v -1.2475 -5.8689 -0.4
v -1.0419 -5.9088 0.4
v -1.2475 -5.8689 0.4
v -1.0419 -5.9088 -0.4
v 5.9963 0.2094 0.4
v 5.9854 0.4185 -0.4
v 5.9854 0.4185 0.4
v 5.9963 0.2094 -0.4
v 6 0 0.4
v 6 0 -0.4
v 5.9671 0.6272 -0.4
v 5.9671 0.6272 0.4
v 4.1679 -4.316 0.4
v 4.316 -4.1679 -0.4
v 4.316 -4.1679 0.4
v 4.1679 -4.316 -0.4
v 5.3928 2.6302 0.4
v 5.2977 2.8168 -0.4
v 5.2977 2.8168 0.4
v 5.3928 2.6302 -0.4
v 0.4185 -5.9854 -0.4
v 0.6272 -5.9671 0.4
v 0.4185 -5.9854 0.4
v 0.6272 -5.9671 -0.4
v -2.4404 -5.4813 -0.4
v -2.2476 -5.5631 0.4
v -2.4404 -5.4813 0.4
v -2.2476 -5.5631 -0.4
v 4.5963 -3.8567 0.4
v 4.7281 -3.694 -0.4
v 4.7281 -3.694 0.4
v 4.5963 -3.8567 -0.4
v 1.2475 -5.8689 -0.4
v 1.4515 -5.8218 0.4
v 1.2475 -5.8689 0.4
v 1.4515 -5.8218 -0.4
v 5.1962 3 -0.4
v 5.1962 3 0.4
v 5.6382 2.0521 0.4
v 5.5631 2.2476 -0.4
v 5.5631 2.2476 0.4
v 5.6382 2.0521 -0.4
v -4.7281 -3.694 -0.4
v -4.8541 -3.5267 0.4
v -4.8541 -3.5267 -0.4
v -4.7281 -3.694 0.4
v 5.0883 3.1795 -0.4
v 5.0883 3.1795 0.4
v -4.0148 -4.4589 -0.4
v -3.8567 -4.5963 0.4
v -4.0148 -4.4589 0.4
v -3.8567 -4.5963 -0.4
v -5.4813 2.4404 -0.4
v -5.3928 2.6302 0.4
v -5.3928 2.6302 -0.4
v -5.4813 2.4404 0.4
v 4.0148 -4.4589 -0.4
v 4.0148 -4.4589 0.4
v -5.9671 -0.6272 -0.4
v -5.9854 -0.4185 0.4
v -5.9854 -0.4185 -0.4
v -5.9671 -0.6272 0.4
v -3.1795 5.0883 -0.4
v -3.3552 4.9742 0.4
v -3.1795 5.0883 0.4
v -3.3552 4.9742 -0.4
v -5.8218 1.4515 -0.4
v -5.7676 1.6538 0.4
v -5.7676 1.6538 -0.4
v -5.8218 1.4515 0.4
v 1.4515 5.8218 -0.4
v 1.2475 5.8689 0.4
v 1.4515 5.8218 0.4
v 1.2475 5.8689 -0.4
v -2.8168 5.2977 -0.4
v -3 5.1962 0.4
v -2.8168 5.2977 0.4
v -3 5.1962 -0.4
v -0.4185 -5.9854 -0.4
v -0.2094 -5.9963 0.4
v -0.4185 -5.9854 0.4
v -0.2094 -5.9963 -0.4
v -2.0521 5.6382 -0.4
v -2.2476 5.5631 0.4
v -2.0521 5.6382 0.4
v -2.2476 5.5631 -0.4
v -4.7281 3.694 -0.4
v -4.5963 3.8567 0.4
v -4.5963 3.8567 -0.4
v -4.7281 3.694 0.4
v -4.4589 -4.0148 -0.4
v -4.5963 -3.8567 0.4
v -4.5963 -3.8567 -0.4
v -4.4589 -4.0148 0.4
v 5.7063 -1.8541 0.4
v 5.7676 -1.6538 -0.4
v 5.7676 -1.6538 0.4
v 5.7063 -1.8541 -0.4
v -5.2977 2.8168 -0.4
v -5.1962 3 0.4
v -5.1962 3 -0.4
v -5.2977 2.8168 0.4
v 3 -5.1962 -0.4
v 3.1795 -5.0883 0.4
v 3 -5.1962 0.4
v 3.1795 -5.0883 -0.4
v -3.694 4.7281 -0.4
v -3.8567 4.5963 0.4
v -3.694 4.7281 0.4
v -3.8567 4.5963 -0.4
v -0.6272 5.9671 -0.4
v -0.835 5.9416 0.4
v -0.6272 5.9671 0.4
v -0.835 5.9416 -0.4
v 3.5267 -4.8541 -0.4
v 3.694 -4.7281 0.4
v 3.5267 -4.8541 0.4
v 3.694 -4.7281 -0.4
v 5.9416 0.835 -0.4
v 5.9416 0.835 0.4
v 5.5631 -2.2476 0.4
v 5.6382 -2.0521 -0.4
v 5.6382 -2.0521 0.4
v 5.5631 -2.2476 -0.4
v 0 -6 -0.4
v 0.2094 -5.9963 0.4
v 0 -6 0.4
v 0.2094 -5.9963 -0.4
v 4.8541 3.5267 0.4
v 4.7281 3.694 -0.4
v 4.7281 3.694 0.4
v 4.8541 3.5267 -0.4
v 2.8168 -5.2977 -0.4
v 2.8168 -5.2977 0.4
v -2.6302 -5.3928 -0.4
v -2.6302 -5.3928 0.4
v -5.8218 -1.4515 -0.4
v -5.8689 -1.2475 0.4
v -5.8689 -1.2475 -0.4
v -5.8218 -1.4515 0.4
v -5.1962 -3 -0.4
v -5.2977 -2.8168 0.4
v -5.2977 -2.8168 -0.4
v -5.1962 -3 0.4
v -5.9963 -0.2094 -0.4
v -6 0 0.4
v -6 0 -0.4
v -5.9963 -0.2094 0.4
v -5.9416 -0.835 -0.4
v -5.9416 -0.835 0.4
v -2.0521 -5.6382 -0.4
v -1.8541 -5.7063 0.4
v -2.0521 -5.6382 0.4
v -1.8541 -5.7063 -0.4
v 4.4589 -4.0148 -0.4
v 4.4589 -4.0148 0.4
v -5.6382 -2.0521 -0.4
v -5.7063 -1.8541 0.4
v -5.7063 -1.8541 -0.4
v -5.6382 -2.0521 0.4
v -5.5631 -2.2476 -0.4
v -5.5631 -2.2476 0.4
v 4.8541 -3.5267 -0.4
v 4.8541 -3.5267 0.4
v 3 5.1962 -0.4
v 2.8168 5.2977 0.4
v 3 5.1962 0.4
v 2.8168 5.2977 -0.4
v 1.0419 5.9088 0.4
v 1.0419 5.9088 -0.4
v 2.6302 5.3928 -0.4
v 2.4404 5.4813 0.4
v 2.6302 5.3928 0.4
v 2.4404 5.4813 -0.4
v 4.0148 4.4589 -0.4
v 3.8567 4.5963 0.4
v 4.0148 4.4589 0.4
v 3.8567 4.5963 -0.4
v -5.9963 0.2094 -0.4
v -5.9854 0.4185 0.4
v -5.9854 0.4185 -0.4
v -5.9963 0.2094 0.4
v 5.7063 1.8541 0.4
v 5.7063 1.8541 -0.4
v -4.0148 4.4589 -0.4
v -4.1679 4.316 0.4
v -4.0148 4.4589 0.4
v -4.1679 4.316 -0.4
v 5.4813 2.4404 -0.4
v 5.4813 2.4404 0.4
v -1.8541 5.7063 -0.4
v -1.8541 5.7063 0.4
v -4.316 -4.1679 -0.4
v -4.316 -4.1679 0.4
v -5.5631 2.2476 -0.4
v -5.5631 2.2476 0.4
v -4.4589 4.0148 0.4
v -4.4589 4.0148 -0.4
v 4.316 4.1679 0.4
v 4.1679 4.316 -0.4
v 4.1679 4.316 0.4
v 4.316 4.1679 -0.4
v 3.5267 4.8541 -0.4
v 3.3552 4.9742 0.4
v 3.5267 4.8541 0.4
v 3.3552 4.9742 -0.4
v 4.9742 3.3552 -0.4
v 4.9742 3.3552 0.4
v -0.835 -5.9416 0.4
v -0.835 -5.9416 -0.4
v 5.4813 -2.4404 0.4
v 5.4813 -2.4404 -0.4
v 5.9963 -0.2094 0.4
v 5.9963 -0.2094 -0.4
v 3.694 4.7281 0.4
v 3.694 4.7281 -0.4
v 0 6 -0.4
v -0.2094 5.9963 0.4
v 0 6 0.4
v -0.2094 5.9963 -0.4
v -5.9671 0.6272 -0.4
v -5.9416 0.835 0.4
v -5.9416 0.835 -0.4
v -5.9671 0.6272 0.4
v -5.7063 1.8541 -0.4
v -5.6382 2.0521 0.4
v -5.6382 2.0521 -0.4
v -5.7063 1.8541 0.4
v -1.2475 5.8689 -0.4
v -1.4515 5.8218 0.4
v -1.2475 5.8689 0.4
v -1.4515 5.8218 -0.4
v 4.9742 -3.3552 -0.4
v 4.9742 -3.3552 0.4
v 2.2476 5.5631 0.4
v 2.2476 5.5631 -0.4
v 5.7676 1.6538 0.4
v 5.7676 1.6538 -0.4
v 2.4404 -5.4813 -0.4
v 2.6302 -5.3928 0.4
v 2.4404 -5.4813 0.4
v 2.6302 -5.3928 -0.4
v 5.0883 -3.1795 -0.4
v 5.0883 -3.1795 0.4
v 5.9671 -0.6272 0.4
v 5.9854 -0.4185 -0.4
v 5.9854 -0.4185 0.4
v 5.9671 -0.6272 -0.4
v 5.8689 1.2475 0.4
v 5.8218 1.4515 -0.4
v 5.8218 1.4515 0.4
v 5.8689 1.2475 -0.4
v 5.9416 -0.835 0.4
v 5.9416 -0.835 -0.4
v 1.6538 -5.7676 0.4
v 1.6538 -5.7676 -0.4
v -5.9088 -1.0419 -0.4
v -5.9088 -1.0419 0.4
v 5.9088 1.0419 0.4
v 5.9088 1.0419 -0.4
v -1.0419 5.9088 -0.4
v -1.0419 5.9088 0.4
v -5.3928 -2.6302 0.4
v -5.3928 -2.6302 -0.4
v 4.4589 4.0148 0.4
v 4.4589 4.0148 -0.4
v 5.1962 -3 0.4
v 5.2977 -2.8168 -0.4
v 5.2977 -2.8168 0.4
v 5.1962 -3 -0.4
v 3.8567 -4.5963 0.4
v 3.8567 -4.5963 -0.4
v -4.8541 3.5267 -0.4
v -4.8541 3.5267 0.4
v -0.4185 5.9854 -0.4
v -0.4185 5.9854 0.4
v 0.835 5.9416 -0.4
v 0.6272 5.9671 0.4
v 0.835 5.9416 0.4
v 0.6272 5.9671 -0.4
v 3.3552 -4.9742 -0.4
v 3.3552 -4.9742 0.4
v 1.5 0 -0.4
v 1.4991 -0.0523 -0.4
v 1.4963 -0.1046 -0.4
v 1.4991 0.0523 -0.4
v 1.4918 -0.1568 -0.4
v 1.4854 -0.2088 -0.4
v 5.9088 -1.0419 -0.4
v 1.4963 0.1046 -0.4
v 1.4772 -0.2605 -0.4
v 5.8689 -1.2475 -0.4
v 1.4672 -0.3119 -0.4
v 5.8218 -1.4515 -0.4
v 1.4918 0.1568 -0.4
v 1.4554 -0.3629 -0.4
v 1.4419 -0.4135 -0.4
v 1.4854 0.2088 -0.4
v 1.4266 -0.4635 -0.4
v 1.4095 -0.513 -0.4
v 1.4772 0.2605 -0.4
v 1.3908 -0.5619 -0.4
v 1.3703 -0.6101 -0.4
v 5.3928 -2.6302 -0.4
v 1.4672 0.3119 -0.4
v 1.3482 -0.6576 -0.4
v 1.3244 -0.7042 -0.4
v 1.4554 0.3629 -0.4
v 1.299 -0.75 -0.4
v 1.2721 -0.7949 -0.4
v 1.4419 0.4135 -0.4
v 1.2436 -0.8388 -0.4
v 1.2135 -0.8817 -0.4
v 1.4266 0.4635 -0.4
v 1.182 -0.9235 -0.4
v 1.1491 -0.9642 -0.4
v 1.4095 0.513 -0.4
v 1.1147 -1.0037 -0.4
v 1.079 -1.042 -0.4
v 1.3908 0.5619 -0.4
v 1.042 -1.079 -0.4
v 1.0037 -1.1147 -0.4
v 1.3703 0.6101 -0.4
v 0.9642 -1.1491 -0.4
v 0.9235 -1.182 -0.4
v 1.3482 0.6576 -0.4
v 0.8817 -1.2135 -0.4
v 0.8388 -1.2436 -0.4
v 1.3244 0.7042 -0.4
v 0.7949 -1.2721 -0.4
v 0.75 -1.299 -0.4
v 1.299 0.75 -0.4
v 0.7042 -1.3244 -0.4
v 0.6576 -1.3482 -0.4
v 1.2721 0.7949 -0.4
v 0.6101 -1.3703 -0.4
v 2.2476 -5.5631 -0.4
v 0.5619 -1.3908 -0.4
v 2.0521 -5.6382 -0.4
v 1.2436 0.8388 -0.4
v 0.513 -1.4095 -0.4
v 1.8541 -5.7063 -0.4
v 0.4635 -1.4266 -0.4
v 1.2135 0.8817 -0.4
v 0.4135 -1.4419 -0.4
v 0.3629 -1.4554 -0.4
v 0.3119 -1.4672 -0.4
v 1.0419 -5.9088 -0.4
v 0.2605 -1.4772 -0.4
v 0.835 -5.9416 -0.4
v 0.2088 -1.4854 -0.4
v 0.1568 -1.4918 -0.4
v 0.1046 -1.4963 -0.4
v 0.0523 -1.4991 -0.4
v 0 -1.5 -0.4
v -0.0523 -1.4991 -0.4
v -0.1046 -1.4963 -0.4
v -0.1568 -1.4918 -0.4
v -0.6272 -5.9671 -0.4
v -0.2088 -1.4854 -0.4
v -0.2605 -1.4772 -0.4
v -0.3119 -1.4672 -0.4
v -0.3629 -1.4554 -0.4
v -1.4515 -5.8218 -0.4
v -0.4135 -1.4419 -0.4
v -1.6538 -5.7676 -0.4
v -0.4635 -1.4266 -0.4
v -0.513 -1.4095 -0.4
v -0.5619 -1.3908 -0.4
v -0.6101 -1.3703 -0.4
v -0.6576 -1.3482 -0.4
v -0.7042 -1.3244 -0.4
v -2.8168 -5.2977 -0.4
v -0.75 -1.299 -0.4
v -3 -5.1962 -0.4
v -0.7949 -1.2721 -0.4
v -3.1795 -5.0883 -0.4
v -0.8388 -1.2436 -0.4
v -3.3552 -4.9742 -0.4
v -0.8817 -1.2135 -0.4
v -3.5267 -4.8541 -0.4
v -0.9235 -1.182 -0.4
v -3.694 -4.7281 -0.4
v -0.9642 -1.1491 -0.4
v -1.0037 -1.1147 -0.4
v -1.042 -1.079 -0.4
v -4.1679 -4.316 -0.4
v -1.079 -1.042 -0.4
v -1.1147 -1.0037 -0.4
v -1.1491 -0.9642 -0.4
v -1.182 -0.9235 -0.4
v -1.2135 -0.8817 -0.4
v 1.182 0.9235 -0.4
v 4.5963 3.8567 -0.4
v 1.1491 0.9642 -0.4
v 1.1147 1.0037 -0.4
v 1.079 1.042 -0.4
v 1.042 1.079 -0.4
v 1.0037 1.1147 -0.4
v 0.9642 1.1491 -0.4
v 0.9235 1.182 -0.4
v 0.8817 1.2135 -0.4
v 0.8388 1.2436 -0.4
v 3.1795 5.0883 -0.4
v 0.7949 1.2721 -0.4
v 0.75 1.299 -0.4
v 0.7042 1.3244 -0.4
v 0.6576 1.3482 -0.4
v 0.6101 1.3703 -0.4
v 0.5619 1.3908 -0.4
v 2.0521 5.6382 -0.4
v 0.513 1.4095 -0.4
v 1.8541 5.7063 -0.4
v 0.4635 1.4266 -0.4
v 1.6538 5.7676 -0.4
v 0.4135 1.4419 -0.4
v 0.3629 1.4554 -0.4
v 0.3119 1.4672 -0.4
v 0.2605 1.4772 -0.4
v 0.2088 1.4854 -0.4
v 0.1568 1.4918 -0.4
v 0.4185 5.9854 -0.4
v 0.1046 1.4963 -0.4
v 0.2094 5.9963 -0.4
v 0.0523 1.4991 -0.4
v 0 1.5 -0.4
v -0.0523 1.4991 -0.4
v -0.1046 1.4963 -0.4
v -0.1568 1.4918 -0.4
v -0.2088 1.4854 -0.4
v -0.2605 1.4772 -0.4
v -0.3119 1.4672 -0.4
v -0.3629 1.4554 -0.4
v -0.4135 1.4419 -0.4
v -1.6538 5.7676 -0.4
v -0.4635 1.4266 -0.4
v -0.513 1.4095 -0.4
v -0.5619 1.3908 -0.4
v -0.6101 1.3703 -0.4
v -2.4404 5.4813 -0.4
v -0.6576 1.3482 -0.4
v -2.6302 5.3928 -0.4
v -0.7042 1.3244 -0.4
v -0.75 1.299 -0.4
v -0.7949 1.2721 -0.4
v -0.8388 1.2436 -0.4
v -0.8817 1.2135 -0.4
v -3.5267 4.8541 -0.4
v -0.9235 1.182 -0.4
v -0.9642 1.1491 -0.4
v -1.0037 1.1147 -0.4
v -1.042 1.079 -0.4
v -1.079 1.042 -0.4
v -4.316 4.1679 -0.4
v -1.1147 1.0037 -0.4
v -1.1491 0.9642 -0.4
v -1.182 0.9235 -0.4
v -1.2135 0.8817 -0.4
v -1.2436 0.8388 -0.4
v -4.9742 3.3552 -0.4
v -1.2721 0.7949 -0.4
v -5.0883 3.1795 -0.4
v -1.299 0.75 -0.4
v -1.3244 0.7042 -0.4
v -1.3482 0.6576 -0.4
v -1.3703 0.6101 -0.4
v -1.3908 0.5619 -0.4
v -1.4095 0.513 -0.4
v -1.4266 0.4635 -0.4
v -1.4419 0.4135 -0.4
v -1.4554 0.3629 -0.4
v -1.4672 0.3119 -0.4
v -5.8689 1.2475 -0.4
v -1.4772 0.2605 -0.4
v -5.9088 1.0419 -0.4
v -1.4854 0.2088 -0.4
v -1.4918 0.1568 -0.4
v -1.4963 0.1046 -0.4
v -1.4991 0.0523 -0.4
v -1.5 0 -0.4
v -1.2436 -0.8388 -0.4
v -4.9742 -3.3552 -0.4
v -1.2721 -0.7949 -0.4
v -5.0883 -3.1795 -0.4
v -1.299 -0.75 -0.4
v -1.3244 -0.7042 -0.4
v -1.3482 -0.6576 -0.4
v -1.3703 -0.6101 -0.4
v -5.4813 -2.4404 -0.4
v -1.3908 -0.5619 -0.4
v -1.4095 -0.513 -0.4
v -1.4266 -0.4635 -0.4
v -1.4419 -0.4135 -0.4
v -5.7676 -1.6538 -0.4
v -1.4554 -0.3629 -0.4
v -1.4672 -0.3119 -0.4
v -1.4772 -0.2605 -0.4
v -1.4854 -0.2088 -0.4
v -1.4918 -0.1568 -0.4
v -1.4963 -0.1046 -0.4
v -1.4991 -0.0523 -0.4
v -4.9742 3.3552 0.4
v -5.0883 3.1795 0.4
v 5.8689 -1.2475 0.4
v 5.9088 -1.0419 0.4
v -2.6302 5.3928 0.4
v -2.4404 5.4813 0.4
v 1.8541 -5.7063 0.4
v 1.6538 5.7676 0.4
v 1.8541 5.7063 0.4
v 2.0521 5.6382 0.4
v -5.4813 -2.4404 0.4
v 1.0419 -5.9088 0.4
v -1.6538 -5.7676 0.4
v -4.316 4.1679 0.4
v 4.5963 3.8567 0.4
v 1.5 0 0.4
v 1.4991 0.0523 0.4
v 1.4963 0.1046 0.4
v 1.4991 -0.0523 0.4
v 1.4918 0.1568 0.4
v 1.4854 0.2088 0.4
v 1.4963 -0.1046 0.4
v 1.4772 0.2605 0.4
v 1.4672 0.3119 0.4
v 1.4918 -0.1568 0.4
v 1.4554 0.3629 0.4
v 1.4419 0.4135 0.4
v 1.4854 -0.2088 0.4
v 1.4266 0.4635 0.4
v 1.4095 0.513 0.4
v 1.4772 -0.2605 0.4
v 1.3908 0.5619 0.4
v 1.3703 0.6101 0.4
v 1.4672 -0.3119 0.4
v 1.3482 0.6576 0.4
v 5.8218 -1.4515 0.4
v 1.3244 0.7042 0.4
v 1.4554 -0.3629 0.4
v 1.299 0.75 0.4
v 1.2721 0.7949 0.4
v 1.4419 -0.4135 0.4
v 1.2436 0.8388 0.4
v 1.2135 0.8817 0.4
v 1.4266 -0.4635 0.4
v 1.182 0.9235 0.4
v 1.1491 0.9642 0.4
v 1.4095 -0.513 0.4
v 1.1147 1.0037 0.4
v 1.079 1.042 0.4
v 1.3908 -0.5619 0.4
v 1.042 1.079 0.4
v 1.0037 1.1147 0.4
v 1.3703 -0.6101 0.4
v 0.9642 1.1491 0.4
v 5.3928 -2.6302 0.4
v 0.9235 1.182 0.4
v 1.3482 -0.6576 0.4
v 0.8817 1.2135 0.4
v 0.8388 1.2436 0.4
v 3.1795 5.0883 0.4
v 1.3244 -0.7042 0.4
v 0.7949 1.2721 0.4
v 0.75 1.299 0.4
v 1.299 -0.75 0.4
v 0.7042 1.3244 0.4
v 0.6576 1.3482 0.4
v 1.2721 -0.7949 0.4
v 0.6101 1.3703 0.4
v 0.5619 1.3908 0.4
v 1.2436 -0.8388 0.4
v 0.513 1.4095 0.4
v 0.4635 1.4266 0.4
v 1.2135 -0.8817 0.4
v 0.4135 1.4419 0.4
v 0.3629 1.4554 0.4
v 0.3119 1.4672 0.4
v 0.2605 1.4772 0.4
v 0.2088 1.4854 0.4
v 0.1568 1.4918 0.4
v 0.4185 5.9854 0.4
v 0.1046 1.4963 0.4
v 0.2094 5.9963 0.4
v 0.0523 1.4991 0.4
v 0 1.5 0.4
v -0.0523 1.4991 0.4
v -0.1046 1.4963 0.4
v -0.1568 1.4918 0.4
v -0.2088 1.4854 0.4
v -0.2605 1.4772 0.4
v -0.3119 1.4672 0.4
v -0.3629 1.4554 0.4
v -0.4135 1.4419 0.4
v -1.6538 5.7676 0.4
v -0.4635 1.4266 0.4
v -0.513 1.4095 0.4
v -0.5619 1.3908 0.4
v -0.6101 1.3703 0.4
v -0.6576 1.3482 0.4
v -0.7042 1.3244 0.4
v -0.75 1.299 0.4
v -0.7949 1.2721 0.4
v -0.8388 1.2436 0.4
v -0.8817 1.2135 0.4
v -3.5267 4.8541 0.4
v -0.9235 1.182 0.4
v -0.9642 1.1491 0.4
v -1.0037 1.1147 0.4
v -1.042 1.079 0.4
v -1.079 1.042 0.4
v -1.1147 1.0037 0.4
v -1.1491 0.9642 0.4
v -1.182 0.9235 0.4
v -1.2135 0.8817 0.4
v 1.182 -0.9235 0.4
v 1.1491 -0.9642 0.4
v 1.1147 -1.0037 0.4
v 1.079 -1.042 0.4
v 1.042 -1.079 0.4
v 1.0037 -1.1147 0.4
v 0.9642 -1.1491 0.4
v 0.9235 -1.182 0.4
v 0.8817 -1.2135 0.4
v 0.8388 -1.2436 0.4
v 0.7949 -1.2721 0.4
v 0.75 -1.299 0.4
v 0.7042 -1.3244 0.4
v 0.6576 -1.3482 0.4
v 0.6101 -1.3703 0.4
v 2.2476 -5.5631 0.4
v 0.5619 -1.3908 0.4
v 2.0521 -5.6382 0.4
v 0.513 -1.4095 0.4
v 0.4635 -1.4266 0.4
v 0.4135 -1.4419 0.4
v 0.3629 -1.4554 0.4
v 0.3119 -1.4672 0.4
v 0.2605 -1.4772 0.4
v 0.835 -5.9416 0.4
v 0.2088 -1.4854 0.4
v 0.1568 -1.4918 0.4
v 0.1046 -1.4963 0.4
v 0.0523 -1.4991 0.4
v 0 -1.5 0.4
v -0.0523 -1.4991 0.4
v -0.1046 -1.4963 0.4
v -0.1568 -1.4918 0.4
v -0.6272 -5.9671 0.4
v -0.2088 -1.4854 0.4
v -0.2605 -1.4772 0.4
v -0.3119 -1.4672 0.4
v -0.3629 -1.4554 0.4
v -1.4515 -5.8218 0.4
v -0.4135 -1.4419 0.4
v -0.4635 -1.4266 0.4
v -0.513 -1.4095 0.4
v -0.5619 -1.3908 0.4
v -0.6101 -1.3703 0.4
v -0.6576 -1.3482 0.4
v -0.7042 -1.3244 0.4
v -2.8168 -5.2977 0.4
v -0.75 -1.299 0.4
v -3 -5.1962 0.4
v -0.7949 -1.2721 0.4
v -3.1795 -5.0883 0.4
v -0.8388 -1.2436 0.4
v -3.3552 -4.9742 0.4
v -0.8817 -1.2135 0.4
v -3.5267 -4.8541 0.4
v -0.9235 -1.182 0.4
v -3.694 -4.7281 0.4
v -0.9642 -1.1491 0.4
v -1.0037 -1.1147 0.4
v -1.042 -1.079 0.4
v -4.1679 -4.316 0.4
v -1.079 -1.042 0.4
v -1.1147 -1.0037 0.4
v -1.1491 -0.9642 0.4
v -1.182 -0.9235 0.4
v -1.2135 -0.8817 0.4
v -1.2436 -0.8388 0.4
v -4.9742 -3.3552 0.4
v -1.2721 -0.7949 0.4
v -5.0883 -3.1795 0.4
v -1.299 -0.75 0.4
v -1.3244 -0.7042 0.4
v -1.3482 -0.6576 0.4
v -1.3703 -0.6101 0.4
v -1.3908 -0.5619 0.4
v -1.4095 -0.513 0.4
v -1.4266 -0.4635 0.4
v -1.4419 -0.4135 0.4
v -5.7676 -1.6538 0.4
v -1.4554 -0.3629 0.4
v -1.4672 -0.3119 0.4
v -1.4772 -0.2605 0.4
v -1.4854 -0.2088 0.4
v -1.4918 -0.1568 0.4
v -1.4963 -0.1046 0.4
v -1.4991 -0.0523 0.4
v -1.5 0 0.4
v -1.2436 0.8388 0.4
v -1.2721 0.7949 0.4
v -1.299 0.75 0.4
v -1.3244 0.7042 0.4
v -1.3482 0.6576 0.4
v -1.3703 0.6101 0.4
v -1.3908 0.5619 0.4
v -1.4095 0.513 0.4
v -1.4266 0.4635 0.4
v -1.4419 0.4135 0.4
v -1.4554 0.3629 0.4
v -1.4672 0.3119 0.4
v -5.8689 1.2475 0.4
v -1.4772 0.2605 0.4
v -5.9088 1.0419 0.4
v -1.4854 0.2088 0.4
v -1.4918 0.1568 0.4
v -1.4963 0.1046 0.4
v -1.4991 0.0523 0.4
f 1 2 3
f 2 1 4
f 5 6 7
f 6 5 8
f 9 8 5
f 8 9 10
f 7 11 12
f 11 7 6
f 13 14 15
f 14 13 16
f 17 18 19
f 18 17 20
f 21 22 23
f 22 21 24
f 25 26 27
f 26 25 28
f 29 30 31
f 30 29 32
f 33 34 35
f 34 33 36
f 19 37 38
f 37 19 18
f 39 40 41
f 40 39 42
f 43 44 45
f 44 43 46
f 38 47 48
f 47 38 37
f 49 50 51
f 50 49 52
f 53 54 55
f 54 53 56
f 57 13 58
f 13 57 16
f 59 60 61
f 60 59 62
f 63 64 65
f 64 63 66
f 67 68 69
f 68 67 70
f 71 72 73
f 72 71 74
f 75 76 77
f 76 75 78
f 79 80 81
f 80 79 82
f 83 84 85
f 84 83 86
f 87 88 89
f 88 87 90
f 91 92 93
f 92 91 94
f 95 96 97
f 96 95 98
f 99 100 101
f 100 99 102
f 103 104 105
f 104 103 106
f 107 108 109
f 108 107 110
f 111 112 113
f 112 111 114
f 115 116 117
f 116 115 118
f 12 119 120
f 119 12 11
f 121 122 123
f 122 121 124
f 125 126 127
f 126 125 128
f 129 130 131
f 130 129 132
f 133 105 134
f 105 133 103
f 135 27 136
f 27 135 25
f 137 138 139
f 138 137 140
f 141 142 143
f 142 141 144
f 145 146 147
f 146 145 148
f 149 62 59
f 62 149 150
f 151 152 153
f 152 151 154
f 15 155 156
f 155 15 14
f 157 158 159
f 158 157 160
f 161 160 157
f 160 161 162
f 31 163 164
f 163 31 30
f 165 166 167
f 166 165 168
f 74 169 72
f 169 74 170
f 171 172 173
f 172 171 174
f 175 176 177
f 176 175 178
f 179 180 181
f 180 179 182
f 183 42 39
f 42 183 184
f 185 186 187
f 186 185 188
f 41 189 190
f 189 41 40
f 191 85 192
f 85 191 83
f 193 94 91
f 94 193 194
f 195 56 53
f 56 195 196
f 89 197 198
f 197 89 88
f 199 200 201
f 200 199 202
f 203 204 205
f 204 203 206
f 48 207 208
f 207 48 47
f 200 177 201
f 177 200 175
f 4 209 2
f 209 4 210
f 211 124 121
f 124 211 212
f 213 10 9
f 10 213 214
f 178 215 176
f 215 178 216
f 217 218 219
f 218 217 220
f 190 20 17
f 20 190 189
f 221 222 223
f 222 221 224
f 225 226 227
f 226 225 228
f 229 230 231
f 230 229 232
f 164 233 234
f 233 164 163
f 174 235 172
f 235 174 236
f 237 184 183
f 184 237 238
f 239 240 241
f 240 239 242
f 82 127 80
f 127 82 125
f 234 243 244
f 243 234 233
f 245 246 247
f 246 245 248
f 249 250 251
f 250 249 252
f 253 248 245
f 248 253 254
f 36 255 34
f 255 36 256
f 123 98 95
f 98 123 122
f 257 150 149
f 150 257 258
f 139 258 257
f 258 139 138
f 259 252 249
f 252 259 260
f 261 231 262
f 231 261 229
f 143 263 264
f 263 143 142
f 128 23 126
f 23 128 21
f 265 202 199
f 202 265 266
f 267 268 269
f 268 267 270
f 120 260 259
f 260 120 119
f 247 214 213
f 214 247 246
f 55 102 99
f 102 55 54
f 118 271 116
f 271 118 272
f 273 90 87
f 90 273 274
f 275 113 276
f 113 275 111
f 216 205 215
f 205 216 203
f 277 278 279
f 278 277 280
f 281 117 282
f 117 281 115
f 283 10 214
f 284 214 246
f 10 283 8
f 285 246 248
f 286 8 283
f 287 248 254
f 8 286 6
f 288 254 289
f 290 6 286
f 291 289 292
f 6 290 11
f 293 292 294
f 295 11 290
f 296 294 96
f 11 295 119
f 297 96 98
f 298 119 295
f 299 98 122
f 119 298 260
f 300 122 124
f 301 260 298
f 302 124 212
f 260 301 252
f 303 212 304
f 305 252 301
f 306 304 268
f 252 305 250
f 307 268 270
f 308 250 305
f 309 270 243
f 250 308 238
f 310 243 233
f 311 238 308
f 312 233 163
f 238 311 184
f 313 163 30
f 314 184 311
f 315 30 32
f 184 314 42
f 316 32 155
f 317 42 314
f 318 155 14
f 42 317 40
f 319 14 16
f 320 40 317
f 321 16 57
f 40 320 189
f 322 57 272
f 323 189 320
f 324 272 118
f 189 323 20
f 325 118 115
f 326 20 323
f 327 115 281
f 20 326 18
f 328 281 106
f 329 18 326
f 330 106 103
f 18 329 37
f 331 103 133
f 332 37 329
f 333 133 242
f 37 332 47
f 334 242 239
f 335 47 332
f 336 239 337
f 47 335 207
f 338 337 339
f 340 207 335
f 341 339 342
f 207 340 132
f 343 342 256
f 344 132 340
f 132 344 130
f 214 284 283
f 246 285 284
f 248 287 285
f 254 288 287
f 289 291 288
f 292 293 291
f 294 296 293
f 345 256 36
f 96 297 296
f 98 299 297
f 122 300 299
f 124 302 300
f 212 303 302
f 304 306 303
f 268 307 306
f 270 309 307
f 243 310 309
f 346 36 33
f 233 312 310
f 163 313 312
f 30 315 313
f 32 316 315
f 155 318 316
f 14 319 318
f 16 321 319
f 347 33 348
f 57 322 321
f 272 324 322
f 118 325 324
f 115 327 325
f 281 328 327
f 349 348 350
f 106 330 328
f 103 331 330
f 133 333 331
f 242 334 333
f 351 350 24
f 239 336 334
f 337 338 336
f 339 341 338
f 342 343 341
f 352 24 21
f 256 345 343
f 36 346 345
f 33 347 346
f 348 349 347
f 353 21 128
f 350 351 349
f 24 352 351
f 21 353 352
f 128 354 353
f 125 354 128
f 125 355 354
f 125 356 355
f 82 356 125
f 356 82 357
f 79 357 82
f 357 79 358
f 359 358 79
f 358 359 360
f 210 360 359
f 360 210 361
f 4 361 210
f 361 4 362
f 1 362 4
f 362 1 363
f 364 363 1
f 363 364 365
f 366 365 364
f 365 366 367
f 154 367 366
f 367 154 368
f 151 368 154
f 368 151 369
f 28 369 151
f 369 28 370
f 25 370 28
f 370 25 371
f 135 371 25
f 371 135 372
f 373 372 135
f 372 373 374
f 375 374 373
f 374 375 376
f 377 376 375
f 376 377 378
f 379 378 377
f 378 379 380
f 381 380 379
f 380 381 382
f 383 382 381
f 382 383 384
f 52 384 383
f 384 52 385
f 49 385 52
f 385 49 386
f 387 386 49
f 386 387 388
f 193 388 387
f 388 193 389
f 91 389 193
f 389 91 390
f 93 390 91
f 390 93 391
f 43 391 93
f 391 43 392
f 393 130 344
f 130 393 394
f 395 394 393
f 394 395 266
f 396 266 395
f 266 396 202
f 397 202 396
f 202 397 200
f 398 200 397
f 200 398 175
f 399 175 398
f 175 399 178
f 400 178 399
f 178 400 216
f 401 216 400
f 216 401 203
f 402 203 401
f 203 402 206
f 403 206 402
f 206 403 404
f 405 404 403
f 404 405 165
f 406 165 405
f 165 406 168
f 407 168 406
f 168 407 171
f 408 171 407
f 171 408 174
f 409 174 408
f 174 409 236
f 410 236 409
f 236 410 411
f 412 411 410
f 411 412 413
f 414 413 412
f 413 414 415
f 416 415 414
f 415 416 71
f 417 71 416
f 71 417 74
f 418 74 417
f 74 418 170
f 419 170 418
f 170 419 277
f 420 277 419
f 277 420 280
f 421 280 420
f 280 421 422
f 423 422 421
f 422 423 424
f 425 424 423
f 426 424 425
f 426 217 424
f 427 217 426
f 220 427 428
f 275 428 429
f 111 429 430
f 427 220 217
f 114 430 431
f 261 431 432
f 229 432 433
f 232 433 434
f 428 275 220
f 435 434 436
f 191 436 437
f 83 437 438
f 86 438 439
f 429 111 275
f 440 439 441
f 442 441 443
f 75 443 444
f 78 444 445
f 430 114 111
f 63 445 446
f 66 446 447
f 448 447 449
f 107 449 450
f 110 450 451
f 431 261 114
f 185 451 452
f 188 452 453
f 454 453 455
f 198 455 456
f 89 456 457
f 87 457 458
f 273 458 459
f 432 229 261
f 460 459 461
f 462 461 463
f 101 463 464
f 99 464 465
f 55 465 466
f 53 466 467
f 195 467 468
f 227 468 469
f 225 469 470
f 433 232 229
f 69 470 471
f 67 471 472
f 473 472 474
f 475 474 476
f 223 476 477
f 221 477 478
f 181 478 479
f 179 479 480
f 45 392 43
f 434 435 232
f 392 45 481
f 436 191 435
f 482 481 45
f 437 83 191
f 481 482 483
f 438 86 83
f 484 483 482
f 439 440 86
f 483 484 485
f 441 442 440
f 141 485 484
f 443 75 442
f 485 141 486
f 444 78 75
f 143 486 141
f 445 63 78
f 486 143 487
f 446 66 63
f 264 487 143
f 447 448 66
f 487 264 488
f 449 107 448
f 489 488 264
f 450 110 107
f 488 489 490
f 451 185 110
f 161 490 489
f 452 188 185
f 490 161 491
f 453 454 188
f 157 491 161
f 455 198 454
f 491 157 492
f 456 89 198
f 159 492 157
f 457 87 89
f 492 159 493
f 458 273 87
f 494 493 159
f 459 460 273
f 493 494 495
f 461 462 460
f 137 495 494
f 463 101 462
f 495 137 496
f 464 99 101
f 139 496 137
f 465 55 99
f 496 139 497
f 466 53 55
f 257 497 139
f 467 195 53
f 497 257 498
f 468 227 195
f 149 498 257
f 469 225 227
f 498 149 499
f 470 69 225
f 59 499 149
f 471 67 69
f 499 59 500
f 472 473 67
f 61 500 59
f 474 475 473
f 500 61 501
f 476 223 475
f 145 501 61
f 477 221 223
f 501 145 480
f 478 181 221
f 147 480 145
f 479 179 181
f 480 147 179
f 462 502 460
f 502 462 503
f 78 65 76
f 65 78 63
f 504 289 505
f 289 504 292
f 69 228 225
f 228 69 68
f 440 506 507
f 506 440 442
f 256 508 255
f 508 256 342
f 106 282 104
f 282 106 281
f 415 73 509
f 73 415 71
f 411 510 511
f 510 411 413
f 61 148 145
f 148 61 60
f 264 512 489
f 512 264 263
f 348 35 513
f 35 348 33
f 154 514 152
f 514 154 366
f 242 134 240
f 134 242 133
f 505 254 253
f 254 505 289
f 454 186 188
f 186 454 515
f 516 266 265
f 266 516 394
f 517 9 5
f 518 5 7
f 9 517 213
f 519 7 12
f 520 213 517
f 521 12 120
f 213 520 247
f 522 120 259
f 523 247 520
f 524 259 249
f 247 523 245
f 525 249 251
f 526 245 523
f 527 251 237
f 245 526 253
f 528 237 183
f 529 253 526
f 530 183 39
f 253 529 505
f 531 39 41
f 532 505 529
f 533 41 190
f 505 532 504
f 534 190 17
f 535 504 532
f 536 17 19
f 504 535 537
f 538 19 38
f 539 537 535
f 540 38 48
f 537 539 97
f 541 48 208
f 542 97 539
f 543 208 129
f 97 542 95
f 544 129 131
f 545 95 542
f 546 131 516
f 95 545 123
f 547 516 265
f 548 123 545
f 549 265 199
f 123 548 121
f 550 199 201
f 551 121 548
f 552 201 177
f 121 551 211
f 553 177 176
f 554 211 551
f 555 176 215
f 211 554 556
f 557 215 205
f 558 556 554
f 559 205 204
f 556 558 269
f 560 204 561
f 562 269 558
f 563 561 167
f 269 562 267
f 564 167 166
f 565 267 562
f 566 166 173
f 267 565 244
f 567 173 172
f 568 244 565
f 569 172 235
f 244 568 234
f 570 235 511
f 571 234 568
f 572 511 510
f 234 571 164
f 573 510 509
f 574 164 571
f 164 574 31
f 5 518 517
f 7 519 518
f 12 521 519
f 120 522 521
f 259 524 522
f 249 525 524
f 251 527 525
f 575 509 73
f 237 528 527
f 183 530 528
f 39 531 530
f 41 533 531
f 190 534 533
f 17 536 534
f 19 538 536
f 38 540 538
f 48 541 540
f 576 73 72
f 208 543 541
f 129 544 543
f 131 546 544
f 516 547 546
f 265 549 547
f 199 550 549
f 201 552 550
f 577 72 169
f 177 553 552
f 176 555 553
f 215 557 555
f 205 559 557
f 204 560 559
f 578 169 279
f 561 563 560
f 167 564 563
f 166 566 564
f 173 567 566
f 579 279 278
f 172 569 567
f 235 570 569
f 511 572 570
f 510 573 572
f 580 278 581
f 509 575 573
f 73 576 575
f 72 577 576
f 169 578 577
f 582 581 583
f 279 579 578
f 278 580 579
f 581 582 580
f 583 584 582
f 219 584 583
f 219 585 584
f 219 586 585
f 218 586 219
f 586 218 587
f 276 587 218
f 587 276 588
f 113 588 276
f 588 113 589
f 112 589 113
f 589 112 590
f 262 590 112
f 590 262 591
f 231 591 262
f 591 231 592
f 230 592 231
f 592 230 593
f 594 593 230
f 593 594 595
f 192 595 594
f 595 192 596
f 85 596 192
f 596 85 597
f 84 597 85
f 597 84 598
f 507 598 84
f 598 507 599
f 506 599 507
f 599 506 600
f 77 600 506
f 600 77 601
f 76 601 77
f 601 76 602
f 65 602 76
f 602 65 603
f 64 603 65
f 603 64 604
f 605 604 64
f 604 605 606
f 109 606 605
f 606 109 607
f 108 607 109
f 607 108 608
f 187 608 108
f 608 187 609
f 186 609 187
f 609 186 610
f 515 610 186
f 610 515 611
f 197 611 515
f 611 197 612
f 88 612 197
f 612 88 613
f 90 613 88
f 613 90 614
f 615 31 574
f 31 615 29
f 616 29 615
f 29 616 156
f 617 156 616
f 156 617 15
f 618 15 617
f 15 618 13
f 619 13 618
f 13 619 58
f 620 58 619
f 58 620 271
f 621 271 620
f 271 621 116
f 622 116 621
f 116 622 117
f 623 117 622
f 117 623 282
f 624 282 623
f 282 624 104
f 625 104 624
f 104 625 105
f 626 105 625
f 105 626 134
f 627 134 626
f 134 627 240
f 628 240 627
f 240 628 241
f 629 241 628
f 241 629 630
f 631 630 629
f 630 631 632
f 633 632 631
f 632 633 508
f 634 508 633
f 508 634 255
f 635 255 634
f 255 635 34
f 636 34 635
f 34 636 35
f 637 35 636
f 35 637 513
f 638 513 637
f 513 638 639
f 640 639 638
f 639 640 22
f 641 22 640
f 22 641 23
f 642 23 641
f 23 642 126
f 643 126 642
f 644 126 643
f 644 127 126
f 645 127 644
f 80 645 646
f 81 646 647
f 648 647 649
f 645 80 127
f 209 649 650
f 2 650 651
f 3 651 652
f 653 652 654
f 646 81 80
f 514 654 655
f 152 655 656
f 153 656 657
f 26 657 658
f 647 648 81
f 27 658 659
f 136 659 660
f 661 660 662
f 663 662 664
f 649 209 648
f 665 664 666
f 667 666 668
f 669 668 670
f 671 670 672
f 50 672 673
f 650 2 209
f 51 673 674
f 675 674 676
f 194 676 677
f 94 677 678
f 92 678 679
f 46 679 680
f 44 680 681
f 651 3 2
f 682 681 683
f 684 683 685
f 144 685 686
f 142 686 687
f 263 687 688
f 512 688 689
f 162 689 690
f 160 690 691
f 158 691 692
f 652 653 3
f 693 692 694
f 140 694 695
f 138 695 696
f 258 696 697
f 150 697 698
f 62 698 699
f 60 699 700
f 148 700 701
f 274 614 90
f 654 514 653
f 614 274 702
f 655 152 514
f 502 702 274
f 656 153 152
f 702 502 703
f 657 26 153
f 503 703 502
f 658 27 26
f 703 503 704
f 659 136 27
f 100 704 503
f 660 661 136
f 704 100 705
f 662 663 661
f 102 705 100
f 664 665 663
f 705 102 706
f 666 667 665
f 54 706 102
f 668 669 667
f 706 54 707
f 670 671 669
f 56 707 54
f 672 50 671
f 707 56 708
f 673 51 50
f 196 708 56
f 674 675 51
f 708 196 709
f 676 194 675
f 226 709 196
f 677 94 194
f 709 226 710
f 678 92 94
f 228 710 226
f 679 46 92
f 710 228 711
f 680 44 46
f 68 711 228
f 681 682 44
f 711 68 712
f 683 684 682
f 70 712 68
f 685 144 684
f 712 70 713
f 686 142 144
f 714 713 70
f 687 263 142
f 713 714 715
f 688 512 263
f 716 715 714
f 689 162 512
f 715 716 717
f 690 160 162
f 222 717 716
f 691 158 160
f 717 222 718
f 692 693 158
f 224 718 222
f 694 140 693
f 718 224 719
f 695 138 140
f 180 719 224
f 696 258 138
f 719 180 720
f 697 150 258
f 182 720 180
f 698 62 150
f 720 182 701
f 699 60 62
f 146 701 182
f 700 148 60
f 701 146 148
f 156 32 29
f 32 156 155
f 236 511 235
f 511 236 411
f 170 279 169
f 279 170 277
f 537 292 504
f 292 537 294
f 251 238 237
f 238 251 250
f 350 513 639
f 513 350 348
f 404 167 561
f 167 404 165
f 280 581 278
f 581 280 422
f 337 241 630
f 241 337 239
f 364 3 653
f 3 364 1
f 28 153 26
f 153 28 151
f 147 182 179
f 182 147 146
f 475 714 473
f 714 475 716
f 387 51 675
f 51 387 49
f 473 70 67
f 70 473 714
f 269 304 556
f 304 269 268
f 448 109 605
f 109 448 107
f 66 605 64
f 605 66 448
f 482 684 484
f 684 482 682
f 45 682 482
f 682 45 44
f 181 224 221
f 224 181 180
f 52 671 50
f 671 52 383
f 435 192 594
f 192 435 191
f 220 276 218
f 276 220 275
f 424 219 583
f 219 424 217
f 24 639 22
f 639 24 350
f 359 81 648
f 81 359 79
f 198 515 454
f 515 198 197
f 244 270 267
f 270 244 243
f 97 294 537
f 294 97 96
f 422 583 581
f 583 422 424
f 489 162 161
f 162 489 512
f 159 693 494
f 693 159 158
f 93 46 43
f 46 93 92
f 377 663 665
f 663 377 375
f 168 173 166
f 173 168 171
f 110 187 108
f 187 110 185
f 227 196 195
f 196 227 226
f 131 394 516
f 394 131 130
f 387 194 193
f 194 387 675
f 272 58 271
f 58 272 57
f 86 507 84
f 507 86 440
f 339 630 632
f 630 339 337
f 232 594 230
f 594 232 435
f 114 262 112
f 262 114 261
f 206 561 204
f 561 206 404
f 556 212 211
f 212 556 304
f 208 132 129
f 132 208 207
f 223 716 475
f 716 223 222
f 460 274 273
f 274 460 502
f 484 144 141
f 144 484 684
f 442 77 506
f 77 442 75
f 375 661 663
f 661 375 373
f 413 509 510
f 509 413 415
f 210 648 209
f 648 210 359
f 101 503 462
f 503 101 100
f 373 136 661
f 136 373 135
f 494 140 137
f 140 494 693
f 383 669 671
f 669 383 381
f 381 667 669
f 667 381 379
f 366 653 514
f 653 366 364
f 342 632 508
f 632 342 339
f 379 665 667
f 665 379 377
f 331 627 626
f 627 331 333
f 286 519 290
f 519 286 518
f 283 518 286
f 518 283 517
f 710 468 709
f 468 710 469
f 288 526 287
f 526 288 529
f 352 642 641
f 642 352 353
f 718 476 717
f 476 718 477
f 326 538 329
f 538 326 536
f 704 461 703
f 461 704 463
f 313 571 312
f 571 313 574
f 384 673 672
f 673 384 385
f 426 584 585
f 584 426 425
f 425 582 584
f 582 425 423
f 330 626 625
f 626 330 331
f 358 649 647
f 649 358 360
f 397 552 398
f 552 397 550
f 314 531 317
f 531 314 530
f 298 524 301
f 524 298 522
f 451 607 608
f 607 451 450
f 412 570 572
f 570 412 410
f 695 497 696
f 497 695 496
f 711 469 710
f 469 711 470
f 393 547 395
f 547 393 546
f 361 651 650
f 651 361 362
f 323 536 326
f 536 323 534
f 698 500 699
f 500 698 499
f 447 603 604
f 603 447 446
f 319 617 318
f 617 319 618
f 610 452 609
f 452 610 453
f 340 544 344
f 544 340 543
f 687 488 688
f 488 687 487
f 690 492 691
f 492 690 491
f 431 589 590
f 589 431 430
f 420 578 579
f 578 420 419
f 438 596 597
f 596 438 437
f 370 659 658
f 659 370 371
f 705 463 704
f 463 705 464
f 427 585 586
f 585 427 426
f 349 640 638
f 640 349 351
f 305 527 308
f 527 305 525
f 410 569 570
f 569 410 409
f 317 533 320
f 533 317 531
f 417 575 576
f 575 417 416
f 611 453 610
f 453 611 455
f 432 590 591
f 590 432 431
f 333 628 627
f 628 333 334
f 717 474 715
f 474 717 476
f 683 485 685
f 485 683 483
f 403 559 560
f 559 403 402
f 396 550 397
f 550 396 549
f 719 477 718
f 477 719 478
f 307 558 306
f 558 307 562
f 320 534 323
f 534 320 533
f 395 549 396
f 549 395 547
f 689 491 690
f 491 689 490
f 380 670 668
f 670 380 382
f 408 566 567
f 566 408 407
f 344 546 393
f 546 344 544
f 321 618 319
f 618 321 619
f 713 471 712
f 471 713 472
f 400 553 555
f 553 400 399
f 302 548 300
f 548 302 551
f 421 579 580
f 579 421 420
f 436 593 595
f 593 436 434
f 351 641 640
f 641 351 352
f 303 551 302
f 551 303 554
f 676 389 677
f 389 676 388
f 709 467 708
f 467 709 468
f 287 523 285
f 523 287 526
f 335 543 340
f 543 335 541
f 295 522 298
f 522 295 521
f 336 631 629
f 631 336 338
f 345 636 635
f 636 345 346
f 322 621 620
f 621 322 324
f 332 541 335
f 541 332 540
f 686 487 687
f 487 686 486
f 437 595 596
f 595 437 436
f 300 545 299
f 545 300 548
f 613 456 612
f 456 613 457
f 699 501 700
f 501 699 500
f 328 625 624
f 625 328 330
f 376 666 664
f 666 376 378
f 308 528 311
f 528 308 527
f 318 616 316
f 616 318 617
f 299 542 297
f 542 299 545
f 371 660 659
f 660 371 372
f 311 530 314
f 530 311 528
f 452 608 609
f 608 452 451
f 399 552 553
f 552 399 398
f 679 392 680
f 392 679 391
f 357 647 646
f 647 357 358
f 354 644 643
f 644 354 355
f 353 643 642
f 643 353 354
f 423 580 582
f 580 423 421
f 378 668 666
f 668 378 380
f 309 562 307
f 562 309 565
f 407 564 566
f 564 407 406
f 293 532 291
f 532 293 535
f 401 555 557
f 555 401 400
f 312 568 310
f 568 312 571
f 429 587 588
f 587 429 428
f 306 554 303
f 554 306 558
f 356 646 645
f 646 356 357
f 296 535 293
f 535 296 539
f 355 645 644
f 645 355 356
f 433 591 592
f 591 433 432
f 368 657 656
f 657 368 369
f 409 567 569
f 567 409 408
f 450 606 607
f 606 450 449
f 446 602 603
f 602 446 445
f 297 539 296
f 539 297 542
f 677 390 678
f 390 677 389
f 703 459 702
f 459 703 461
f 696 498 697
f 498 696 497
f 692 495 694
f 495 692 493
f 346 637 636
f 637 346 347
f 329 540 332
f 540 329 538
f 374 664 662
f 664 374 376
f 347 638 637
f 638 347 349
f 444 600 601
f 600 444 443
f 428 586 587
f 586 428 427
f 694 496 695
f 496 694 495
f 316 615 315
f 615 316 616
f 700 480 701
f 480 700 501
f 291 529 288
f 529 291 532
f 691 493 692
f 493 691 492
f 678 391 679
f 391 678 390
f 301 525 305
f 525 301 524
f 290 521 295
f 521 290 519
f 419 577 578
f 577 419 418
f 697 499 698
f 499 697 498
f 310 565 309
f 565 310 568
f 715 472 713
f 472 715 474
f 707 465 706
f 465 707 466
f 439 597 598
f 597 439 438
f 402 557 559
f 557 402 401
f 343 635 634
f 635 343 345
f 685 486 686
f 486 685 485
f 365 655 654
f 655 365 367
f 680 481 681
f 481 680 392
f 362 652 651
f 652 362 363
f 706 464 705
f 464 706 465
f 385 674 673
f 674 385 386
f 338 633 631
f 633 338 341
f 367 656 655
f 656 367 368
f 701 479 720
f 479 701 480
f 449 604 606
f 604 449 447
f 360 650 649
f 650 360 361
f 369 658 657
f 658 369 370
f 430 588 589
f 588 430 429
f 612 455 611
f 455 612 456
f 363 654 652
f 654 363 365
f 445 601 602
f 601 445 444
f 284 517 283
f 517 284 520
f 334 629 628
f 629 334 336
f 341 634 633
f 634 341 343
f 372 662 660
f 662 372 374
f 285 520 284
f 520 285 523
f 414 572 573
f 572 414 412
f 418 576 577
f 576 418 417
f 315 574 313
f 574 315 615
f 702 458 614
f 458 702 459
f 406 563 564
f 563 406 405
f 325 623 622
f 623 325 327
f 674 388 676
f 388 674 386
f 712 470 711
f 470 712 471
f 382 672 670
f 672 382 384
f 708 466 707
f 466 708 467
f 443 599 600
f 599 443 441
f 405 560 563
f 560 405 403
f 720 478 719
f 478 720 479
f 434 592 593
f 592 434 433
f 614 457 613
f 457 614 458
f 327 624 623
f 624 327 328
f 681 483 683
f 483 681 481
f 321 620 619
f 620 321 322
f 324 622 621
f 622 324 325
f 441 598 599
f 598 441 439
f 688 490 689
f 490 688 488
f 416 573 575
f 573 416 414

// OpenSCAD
// Penny washer: 3.0mm inner hole, 12.0mm outer diameter, 0.8mm thickness

$fn = 180;  // high resolution for true circular edges

inner_diameter = 3.0;
outer_diameter = 12.0;
thickness      = 0.8;

module penny_washer(id=inner_diameter, od=outer_diameter, t=thickness) {
    difference() {
        cylinder(h=t, d=od, center=true);
        cylinder(h=t + 0.2, d=id, center=true);  // slight overshoot ensures clean through-hole
    }
}

penny_washer();
